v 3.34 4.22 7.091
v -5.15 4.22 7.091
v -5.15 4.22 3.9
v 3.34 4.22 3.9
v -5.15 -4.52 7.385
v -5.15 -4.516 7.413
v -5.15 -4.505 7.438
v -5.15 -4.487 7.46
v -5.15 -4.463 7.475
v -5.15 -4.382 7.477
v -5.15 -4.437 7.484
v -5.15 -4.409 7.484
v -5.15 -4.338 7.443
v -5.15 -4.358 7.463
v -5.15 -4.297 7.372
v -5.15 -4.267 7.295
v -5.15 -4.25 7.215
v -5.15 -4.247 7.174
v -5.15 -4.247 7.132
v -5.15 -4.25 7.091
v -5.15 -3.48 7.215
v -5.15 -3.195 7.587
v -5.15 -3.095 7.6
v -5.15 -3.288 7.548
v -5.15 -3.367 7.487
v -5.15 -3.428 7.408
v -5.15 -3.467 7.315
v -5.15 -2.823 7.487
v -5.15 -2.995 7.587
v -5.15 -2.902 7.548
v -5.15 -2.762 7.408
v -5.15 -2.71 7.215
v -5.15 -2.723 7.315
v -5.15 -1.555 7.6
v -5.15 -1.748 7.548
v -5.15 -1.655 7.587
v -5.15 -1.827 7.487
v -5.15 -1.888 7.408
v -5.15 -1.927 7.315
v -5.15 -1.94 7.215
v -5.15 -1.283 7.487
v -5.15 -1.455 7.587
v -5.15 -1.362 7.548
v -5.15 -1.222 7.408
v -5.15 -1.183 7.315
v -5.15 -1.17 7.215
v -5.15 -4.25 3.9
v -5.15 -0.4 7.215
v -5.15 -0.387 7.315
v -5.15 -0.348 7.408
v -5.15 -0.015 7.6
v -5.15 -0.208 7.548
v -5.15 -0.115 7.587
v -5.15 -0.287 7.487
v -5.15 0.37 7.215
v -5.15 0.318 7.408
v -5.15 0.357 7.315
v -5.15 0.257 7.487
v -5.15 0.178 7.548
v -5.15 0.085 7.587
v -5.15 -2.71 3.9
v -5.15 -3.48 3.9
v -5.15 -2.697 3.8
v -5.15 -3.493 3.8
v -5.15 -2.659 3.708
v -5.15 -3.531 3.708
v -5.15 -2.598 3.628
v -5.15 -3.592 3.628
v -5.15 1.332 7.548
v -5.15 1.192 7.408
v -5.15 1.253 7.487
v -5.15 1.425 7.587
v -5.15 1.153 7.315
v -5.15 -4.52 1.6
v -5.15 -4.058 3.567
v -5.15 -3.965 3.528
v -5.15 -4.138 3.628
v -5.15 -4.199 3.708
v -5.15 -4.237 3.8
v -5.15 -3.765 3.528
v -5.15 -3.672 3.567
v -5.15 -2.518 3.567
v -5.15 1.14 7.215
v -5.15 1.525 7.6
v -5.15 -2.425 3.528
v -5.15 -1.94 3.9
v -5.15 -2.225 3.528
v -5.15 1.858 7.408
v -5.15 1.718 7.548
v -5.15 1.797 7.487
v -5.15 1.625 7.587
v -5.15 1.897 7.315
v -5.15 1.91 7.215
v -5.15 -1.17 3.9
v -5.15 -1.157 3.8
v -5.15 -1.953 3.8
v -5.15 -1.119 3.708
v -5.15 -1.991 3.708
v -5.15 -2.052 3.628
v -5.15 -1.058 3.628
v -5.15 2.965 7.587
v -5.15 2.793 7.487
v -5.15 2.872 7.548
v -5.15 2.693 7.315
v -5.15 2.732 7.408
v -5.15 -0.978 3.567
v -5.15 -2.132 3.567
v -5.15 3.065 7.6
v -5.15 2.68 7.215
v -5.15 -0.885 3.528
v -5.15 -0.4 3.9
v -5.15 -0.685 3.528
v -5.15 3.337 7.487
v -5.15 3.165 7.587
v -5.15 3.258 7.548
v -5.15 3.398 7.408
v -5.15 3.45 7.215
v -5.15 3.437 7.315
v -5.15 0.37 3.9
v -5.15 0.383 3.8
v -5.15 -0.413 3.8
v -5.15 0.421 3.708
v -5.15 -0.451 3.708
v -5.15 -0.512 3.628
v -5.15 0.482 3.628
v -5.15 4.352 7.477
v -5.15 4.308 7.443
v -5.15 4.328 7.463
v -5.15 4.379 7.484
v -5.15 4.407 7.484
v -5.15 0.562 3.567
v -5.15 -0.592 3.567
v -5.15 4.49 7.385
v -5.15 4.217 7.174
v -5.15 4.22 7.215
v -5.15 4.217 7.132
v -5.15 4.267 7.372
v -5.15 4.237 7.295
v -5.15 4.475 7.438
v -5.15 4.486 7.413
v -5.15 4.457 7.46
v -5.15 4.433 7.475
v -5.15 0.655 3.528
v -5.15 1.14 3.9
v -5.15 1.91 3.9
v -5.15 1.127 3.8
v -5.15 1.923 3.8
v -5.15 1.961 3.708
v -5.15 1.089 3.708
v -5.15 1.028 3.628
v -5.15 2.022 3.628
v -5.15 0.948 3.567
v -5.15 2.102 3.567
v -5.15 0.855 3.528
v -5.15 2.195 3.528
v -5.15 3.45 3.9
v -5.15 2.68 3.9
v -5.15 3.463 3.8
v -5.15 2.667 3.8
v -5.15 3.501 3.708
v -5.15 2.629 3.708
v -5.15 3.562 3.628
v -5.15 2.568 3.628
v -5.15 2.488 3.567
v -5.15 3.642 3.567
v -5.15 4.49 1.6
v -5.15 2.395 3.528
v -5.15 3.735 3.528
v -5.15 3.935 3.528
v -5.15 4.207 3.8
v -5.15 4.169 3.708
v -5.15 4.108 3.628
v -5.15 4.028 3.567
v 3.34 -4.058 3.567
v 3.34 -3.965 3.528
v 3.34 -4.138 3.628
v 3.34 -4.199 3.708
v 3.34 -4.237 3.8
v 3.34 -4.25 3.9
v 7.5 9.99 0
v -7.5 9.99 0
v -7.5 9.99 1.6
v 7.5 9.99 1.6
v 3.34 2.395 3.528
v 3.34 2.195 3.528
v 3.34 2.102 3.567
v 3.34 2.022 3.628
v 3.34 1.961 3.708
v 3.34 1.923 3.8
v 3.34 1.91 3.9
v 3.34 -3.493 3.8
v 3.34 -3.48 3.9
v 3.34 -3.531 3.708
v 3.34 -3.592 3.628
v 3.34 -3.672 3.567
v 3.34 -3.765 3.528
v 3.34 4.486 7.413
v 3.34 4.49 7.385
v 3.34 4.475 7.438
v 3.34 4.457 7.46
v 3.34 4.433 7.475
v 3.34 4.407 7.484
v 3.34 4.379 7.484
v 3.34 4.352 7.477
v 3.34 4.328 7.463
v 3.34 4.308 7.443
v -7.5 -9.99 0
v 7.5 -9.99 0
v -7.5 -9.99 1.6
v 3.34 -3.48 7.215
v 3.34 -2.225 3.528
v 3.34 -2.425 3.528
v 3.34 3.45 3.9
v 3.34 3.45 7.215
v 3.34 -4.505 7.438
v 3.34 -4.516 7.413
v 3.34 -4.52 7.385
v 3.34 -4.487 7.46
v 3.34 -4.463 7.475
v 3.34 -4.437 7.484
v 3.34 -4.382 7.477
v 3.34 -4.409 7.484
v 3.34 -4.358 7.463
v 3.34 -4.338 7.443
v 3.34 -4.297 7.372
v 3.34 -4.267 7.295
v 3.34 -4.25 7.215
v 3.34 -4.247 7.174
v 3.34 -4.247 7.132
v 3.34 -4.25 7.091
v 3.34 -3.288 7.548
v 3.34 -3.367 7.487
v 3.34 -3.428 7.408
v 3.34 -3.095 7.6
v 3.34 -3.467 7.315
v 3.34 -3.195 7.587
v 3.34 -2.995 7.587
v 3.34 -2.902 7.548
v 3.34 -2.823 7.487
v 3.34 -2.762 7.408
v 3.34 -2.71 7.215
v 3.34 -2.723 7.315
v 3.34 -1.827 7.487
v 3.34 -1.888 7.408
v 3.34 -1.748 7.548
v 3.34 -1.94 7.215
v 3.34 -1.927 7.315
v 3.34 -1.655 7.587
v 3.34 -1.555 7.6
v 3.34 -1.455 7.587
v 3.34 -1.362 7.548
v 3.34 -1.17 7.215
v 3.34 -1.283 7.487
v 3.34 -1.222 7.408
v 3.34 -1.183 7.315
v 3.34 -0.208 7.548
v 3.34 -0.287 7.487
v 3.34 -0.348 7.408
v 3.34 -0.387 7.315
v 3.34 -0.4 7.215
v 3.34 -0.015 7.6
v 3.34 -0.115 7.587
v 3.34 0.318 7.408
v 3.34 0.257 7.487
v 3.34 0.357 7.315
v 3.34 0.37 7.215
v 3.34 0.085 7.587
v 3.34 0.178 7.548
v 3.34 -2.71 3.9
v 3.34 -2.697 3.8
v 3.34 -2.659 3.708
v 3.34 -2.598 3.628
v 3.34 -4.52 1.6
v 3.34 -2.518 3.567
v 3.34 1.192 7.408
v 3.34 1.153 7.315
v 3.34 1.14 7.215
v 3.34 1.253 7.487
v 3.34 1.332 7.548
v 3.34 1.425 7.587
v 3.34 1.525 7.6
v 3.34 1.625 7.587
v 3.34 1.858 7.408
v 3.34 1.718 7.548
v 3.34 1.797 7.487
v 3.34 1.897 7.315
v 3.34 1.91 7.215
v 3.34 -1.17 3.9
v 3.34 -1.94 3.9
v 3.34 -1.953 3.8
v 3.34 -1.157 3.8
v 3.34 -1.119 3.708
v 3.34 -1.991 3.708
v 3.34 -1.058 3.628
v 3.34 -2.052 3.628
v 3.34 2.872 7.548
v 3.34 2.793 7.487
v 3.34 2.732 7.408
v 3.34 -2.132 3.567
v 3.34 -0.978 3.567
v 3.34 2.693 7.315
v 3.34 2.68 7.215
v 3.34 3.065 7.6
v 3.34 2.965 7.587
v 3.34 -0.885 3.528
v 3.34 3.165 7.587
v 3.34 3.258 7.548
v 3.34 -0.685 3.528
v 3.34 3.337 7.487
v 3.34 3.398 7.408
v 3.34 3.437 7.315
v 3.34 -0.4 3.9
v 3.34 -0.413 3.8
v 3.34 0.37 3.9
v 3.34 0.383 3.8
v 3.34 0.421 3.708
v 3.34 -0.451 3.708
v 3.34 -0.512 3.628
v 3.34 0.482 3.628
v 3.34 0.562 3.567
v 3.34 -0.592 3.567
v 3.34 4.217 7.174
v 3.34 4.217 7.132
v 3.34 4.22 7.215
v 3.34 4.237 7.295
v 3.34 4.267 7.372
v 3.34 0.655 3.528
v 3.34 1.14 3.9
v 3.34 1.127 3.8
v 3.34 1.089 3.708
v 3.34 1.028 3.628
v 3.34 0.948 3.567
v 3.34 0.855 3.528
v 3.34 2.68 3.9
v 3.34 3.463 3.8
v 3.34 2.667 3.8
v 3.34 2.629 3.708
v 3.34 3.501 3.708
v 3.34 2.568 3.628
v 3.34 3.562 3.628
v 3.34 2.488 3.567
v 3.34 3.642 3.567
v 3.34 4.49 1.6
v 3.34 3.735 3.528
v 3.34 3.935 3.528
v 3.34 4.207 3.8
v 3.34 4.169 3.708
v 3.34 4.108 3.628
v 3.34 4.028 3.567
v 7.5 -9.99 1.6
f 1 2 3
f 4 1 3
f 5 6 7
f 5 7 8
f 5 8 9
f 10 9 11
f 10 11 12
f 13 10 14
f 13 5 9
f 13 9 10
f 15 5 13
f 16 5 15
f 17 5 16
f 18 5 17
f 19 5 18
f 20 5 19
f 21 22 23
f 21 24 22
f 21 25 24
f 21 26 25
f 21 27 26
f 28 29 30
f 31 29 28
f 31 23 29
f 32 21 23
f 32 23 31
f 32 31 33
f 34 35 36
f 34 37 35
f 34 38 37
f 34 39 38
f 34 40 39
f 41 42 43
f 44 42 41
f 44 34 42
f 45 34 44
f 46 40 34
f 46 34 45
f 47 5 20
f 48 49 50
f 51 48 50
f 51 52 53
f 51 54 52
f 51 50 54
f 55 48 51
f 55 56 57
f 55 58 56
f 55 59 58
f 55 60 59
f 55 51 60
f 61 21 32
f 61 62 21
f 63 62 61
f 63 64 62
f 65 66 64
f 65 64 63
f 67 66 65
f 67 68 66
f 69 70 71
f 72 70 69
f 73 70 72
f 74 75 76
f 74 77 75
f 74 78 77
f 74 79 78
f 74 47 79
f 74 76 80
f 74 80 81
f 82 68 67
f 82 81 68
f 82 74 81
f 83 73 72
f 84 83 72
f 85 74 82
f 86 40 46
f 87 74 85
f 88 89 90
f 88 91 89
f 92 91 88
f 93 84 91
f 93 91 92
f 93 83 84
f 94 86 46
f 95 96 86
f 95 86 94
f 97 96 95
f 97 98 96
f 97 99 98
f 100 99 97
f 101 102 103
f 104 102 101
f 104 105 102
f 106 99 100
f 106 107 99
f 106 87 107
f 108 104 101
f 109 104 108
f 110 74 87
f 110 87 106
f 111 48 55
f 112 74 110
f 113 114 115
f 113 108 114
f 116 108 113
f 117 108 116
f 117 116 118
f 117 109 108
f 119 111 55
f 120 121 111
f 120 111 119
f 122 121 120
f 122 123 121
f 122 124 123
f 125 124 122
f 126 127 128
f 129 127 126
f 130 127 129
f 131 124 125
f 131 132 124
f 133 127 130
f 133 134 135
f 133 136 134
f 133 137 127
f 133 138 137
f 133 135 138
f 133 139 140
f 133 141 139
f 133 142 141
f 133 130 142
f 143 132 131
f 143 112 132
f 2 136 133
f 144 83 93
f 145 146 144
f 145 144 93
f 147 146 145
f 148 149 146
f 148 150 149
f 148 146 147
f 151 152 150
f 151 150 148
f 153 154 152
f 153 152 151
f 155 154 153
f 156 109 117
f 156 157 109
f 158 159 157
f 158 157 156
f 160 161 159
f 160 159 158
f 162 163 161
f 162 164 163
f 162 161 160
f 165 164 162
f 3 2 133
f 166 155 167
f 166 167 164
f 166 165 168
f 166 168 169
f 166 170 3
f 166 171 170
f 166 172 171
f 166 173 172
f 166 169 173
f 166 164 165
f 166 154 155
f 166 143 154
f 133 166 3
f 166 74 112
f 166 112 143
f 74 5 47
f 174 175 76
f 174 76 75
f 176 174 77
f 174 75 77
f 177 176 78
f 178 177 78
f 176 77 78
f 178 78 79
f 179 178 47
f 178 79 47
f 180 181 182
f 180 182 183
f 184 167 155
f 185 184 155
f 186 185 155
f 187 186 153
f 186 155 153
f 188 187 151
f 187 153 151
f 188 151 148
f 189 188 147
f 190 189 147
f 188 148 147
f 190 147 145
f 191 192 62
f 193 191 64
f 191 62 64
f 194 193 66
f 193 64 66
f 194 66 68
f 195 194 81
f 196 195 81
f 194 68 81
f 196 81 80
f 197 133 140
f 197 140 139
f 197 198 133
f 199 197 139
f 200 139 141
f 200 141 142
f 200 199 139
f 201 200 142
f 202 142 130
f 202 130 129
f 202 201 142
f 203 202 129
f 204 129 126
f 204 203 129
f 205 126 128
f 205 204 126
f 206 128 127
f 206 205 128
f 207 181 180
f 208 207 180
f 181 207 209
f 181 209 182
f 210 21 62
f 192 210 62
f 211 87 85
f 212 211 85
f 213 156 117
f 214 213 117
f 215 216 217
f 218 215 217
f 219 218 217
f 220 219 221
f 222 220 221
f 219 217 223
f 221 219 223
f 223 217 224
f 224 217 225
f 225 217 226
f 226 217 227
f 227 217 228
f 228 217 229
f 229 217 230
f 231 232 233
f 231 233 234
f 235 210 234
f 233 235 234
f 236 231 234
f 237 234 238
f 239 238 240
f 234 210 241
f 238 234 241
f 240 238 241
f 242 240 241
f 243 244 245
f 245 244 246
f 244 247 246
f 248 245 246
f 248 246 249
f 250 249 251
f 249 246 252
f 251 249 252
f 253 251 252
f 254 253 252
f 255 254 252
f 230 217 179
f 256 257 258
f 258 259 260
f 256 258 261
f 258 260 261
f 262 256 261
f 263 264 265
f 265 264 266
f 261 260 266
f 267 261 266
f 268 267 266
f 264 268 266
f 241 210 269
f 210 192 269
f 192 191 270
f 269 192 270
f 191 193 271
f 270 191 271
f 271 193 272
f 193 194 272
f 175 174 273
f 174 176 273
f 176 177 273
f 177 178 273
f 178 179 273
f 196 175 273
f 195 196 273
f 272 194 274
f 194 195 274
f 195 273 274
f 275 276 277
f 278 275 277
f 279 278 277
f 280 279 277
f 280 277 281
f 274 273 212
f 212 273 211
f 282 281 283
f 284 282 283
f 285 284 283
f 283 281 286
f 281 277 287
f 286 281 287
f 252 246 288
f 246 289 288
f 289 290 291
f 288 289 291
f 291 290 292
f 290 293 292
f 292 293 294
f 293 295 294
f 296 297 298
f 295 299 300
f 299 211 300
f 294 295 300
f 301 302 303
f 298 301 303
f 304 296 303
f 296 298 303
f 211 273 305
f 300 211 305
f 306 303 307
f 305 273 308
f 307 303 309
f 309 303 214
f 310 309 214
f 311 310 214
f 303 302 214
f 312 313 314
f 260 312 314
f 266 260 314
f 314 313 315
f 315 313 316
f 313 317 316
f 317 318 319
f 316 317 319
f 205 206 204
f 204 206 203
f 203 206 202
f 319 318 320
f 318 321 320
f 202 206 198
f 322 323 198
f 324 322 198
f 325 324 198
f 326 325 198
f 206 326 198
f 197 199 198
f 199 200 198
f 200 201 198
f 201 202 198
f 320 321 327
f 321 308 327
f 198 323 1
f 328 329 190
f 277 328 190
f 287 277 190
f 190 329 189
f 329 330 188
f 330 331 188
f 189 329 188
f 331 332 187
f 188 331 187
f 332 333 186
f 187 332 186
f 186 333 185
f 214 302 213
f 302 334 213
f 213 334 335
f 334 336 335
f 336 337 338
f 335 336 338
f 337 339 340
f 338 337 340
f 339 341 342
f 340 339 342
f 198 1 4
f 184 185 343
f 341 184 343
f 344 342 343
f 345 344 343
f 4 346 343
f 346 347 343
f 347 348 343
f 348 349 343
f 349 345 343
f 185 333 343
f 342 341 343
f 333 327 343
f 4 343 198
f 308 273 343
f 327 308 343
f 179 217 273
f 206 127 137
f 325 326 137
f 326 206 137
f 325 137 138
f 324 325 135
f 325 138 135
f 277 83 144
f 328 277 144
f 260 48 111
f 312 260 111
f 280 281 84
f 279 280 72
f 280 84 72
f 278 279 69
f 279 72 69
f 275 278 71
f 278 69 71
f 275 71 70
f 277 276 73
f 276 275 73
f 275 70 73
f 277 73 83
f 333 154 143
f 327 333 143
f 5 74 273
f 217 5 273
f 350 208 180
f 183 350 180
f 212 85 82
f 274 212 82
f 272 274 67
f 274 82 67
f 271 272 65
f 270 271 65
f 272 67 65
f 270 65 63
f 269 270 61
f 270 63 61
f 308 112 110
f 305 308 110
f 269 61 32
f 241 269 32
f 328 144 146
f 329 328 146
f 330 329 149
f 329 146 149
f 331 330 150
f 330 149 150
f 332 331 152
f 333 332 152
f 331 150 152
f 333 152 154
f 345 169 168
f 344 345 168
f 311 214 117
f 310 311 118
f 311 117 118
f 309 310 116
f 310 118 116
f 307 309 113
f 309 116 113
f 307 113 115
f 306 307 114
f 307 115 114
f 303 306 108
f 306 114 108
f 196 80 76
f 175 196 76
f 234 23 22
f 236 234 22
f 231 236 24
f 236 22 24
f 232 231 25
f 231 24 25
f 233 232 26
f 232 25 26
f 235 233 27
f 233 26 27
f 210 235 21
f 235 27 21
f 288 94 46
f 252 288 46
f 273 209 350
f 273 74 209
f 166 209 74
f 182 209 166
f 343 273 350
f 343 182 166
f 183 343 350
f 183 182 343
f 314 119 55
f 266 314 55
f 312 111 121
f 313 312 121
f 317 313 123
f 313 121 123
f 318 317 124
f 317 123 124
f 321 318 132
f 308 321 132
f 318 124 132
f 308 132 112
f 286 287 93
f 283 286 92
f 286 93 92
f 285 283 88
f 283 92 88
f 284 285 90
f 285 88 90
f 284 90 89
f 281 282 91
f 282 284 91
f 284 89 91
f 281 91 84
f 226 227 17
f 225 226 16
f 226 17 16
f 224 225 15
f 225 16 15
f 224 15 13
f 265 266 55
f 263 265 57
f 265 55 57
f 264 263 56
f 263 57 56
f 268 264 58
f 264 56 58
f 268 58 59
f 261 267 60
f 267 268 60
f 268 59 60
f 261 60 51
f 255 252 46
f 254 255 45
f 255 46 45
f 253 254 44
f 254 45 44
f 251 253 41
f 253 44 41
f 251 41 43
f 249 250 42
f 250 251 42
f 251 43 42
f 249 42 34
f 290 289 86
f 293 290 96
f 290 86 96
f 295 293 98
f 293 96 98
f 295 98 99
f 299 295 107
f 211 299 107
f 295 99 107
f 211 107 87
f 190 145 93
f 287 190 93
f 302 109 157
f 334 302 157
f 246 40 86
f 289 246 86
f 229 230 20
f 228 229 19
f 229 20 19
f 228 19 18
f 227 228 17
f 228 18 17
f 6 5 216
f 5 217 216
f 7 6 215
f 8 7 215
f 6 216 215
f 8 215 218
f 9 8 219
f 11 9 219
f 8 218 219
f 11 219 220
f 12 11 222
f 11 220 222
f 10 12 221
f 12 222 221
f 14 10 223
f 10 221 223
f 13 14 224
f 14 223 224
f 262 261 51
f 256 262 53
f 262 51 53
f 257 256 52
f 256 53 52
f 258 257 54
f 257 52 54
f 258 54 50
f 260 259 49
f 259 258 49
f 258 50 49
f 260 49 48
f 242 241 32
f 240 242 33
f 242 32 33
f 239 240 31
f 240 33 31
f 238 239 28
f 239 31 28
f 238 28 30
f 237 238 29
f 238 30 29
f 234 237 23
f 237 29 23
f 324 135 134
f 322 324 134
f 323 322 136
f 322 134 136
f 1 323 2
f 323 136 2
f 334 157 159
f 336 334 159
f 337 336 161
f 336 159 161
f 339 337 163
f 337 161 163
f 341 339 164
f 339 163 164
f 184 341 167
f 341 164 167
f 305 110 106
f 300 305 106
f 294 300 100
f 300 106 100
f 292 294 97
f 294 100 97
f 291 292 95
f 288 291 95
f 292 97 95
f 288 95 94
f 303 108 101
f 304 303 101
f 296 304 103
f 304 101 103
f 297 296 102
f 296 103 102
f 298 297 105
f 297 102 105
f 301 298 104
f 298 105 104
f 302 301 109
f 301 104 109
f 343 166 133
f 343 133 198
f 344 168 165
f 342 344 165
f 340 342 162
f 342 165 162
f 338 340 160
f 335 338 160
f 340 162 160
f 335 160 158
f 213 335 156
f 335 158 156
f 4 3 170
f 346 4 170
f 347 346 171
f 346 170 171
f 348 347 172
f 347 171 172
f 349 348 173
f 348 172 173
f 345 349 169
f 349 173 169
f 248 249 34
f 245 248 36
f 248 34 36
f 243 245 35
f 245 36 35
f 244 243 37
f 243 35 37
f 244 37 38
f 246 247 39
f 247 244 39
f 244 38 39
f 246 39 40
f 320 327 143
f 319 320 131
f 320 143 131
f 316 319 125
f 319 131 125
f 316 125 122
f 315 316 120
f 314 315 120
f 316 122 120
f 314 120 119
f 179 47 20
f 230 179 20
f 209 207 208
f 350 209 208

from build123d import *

# Parameters (mm, degrees)
CROQUIS1_W              = 15
CROQUIS1_H              = 19.98
SALIENTE_EXTRUIR1_DEPTH = 1.6
CROQUIS2_W              = 8.49
CROQUIS2_H              = 9.01
SALIENTE_EXTRUIR2_DEPTH = 6
CORTAR_EXTRUIR1_DEPTH   = 18.820847342
REDONDEO1_R             = 0.1
REDONDEO2_R             = 0.1


with BuildPart() as part:
    # Croquis1 → Saliente-Extruir1 (new body)
    with BuildSketch(Plane.XY):
        Rectangle(CROQUIS1_W, CROQUIS1_H)
    extrude(amount=SALIENTE_EXTRUIR1_DEPTH)

    # Croquis2 → Saliente-Extruir2 (add)
    with BuildSketch(Plane.XY.offset(1.6)):
        with Locations((-0.905, -0.015)):
            Rectangle(CROQUIS2_W, CROQUIS2_H)
    extrude(amount=SALIENTE_EXTRUIR2_DEPTH)

    # Croquis3 → Cortar-Extruir1 (cut, through all)
    with BuildSketch(Plane.ZY.offset(5.15)):
        with BuildLine():
            ThreePointArc((7.215, 3.45), (7.487236111, 3.337236111), (7.6, 3.065))
            Line((7.6, 3.065), (7.6, 4.49))
            ThreePointArc((7.6, 4.49), (7.441092235, 4.307099962), (7.215, 4.22))
            ThreePointArc((7.215, 4.22), (7.153028067, 4.216157783), (7.091056134, 4.22))
            Line((7.091056134, 4.22), (3.9, 4.22))
            ThreePointArc((3.9, 4.22), (3.6659049, 4.14065419), (3.528300528, 3.935321996))
            Line((3.528300528, 3.935321996), (3.528300528, 3.734678004))
            ThreePointArc((3.528300528, 3.734678004), (3.6659049, 3.52934581), (3.9, 3.45))
            Line((3.9, 3.45), (7.215, 3.45))
        make_face()
        with BuildLine():
            ThreePointArc((7.215, 1.91), (7.487236111, 1.797236111), (7.6, 1.525))
            Line((7.6, 1.525), (7.6, 3.065))
            ThreePointArc((7.6, 3.065), (7.487236111, 2.792763889), (7.215, 2.68))
            Line((7.215, 2.68), (3.9, 2.68))
            ThreePointArc((3.9, 2.68), (3.6659049, 2.60065419), (3.528300528, 2.395321996))
            Line((3.528300528, 2.395321996), (3.528300528, 2.194678004))
            ThreePointArc((3.528300528, 2.194678004), (3.6659049, 1.98934581), (3.9, 1.91))
            Line((3.9, 1.91), (7.215, 1.91))
        make_face()
        with BuildLine():
            Line((3.9, 0.37), (7.215, 0.37))
            ThreePointArc((7.215, 0.37), (7.487236111, 0.257236111), (7.6, -0.015))
            Line((7.6, -0.015), (7.6, 1.525))
            ThreePointArc((7.6, 1.525), (7.487236111, 1.252763889), (7.215, 1.14))
            Line((7.215, 1.14), (3.9, 1.14))
            ThreePointArc((3.9, 1.14), (3.6659049, 1.06065419), (3.528300528, 0.855321996))
            Line((3.528300528, 0.855321996), (3.528300528, 0.654678004))
            ThreePointArc((3.528300528, 0.654678004), (3.6659049, 0.44934581), (3.9, 0.37))
        make_face()
        with BuildLine():
            Line((7.6, -1.555), (7.6, -0.015))
            ThreePointArc((7.6, -0.015), (7.487236111, -0.287236111), (7.215, -0.4))
            Line((7.215, -0.4), (3.9, -0.4))
            ThreePointArc((3.9, -0.4), (3.6659049, -0.47934581), (3.528300528, -0.684678004))
            Line((3.528300528, -0.684678004), (3.528300528, -0.885321996))
            ThreePointArc((3.528300528, -0.885321996), (3.6659049, -1.09065419), (3.9, -1.17))
            Line((3.9, -1.17), (7.215, -1.17))
            ThreePointArc((7.215, -1.17), (7.487236111, -1.282763889), (7.6, -1.555))
        make_face()
        with BuildLine():
            Line((7.6, -3.095), (7.6, -1.555))
            ThreePointArc((7.6, -1.555), (7.487236111, -1.827236111), (7.215, -1.94))
            Line((7.215, -1.94), (3.9, -1.94))
            ThreePointArc((3.9, -1.94), (3.6659049, -2.01934581), (3.528300528, -2.224678004))
            Line((3.528300528, -2.224678004), (3.528300528, -2.425321996))
            ThreePointArc((3.528300528, -2.425321996), (3.6659049, -2.63065419), (3.9, -2.71))
            Line((3.9, -2.71), (7.215, -2.71))
            ThreePointArc((7.215, -2.71), (7.487236111, -2.822763889), (7.6, -3.095))
        make_face()
        with BuildLine():
            Line((7.6, -4.52), (7.6, -3.095))
            ThreePointArc((7.6, -3.095), (7.487236111, -3.367236111), (7.215, -3.48))
            Line((7.215, -3.48), (3.9, -3.48))
            ThreePointArc((3.9, -3.48), (3.6659049, -3.55934581), (3.528300528, -3.764678004))
            Line((3.528300528, -3.764678004), (3.528300528, -3.965321996))
            ThreePointArc((3.528300528, -3.965321996), (3.6659049, -4.17065419), (3.9, -4.25))
            Line((3.9, -4.25), (7.091056134, -4.25))
            ThreePointArc((7.091056134, -4.25), (7.153028067, -4.246157783), (7.215, -4.25))
            ThreePointArc((7.215, -4.25), (7.441092235, -4.337099962), (7.6, -4.52))
        make_face()
    extrude(amount=-CORTAR_EXTRUIR1_DEPTH, mode=Mode.SUBTRACT)

    # Redondeo1
    redondeo1_edges = [part.edges().sort_by_distance(p)[0] for p in [
        (-0.905, -4.52, 7.6),
    ]]
    fillet(redondeo1_edges, radius=REDONDEO1_R)

    # Redondeo2
    redondeo2_edges = [part.edges().sort_by_distance(p)[0] for p in [
        (-0.905, 4.49, 7.6),
    ]]
    fillet(redondeo2_edges, radius=REDONDEO2_R)


solid = part.part
